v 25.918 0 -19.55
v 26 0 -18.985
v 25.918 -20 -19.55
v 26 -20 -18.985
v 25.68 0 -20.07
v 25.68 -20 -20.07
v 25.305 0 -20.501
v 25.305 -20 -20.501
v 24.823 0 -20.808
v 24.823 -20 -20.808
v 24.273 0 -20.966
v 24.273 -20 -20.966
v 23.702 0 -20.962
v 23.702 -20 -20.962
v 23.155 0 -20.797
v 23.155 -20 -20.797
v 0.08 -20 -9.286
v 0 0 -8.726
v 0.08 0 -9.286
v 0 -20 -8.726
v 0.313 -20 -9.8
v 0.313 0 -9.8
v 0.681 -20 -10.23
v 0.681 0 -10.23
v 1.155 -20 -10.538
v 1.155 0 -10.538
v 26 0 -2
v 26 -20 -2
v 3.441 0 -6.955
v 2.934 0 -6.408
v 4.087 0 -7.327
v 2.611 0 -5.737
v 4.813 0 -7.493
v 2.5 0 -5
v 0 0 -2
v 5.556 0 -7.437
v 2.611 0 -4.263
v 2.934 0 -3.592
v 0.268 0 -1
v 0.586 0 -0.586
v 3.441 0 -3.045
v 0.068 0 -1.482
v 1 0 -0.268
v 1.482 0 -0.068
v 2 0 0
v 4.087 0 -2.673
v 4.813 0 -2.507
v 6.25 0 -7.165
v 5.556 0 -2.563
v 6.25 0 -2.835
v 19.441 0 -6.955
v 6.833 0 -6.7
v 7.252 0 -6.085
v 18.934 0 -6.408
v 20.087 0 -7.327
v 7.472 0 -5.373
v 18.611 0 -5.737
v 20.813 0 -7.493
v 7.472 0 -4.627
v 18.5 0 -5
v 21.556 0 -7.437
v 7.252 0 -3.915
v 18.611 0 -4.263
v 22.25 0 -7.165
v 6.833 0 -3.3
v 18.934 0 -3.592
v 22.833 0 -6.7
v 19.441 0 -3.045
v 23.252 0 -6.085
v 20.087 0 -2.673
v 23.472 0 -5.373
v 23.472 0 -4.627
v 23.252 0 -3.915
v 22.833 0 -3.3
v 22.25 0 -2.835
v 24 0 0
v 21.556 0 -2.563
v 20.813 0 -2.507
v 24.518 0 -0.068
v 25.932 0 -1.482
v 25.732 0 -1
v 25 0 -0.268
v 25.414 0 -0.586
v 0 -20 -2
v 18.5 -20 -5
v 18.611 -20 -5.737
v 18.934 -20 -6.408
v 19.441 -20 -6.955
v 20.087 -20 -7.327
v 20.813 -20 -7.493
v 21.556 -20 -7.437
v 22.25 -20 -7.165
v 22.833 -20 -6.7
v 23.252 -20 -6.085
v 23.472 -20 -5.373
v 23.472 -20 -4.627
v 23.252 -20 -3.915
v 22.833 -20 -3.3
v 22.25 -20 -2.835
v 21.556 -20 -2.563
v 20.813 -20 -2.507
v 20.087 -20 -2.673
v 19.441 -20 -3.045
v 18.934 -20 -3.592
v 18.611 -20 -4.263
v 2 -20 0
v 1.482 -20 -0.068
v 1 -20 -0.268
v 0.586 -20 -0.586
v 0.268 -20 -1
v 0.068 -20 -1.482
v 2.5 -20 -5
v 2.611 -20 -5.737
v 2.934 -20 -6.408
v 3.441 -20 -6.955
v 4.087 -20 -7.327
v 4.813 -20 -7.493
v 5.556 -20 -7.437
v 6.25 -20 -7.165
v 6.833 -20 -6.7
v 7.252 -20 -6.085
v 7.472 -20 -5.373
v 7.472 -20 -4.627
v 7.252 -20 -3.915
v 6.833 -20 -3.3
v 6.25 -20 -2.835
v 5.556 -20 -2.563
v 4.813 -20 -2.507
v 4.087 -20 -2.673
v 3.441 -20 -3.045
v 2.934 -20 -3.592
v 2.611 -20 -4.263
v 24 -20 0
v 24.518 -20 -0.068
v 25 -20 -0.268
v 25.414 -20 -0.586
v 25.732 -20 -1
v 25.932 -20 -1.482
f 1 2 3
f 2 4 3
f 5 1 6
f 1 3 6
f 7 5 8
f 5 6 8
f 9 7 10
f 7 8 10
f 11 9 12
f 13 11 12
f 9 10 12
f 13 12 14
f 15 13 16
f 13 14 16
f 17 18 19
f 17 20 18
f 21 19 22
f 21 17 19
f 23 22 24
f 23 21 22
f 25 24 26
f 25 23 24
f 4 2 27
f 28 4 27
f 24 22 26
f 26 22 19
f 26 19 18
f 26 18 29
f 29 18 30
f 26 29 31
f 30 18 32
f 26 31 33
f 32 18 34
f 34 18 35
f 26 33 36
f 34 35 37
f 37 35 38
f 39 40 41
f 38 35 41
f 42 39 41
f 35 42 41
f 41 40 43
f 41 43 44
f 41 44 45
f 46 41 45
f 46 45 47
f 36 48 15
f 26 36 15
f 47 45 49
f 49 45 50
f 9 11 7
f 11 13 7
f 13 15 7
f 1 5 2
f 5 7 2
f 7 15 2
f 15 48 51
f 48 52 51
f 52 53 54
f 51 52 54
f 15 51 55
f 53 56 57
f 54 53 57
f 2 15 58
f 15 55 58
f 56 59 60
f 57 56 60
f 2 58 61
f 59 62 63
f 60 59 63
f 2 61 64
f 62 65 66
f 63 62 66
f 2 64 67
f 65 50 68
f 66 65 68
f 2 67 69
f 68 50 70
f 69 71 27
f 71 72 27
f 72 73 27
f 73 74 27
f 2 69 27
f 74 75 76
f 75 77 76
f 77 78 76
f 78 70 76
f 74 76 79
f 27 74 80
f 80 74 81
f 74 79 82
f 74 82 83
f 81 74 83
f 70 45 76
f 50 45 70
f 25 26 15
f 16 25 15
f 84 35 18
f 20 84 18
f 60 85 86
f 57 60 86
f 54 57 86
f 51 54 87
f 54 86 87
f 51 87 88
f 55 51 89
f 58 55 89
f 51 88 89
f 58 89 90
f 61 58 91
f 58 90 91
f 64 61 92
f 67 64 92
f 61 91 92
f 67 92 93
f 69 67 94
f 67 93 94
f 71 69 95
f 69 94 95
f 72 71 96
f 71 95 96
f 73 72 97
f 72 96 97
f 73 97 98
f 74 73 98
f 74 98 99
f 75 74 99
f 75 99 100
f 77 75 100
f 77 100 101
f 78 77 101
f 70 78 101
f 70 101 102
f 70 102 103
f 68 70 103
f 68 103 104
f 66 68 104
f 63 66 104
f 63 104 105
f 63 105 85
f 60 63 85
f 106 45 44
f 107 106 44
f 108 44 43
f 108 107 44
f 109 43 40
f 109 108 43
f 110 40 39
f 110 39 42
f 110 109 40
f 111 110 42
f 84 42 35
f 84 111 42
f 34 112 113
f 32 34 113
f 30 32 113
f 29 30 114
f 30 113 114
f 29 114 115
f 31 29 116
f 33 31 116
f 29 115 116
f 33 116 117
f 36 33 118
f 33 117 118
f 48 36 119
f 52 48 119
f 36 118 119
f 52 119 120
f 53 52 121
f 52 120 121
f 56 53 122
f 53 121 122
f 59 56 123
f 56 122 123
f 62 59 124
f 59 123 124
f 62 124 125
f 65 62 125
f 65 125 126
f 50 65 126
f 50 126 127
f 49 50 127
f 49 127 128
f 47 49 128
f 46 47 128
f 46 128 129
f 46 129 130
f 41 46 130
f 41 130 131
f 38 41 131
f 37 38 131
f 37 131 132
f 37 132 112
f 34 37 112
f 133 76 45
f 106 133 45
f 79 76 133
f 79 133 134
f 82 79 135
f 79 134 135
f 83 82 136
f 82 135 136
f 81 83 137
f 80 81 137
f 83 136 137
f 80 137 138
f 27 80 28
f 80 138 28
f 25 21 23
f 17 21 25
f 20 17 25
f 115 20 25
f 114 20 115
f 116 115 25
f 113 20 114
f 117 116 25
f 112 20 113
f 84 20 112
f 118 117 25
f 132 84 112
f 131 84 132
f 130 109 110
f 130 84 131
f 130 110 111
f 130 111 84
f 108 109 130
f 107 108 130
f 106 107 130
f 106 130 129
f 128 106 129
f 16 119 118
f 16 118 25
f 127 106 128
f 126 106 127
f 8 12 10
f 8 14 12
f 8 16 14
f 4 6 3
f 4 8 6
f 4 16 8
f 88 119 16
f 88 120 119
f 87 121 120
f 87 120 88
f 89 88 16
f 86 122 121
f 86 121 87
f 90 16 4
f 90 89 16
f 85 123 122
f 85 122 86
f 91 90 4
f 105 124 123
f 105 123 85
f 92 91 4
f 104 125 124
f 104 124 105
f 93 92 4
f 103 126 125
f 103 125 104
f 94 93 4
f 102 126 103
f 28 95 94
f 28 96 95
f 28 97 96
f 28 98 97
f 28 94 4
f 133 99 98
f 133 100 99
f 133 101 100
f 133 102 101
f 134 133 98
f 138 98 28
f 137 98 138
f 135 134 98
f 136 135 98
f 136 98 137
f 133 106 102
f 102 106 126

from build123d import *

# Parameters (mm, degrees)
F1_DEPTH = 20
F2_D     = 5
F3_R     = 2


with BuildPart() as f1:
    # F0 (on Front) → F1 (new body)
    with BuildSketch(Plane.XZ):
        Polygon((26, 0), (0, 0), (0, -10), (26, -22.123999112), align=None)
    extrude(amount=F1_DEPTH)

    # F2 (through all)
    with Locations(Plane(origin=(0, 0, 0), x_dir=(1, 0, 0), z_dir=(0, 1, 0))):
        with Locations((5, 5), (21, 5)):
            Hole(F2_D / 2)

    # F3
    f3_edges = [f1.edges().sort_by_distance(p)[0] for p in [
        (26, -10, -22.123999),
        (0, -10, -10),
        (0, -10, 0),
        (26, -10, 0),
    ]]
    fillet(f3_edges, radius=F3_R)


solid = f1.part
